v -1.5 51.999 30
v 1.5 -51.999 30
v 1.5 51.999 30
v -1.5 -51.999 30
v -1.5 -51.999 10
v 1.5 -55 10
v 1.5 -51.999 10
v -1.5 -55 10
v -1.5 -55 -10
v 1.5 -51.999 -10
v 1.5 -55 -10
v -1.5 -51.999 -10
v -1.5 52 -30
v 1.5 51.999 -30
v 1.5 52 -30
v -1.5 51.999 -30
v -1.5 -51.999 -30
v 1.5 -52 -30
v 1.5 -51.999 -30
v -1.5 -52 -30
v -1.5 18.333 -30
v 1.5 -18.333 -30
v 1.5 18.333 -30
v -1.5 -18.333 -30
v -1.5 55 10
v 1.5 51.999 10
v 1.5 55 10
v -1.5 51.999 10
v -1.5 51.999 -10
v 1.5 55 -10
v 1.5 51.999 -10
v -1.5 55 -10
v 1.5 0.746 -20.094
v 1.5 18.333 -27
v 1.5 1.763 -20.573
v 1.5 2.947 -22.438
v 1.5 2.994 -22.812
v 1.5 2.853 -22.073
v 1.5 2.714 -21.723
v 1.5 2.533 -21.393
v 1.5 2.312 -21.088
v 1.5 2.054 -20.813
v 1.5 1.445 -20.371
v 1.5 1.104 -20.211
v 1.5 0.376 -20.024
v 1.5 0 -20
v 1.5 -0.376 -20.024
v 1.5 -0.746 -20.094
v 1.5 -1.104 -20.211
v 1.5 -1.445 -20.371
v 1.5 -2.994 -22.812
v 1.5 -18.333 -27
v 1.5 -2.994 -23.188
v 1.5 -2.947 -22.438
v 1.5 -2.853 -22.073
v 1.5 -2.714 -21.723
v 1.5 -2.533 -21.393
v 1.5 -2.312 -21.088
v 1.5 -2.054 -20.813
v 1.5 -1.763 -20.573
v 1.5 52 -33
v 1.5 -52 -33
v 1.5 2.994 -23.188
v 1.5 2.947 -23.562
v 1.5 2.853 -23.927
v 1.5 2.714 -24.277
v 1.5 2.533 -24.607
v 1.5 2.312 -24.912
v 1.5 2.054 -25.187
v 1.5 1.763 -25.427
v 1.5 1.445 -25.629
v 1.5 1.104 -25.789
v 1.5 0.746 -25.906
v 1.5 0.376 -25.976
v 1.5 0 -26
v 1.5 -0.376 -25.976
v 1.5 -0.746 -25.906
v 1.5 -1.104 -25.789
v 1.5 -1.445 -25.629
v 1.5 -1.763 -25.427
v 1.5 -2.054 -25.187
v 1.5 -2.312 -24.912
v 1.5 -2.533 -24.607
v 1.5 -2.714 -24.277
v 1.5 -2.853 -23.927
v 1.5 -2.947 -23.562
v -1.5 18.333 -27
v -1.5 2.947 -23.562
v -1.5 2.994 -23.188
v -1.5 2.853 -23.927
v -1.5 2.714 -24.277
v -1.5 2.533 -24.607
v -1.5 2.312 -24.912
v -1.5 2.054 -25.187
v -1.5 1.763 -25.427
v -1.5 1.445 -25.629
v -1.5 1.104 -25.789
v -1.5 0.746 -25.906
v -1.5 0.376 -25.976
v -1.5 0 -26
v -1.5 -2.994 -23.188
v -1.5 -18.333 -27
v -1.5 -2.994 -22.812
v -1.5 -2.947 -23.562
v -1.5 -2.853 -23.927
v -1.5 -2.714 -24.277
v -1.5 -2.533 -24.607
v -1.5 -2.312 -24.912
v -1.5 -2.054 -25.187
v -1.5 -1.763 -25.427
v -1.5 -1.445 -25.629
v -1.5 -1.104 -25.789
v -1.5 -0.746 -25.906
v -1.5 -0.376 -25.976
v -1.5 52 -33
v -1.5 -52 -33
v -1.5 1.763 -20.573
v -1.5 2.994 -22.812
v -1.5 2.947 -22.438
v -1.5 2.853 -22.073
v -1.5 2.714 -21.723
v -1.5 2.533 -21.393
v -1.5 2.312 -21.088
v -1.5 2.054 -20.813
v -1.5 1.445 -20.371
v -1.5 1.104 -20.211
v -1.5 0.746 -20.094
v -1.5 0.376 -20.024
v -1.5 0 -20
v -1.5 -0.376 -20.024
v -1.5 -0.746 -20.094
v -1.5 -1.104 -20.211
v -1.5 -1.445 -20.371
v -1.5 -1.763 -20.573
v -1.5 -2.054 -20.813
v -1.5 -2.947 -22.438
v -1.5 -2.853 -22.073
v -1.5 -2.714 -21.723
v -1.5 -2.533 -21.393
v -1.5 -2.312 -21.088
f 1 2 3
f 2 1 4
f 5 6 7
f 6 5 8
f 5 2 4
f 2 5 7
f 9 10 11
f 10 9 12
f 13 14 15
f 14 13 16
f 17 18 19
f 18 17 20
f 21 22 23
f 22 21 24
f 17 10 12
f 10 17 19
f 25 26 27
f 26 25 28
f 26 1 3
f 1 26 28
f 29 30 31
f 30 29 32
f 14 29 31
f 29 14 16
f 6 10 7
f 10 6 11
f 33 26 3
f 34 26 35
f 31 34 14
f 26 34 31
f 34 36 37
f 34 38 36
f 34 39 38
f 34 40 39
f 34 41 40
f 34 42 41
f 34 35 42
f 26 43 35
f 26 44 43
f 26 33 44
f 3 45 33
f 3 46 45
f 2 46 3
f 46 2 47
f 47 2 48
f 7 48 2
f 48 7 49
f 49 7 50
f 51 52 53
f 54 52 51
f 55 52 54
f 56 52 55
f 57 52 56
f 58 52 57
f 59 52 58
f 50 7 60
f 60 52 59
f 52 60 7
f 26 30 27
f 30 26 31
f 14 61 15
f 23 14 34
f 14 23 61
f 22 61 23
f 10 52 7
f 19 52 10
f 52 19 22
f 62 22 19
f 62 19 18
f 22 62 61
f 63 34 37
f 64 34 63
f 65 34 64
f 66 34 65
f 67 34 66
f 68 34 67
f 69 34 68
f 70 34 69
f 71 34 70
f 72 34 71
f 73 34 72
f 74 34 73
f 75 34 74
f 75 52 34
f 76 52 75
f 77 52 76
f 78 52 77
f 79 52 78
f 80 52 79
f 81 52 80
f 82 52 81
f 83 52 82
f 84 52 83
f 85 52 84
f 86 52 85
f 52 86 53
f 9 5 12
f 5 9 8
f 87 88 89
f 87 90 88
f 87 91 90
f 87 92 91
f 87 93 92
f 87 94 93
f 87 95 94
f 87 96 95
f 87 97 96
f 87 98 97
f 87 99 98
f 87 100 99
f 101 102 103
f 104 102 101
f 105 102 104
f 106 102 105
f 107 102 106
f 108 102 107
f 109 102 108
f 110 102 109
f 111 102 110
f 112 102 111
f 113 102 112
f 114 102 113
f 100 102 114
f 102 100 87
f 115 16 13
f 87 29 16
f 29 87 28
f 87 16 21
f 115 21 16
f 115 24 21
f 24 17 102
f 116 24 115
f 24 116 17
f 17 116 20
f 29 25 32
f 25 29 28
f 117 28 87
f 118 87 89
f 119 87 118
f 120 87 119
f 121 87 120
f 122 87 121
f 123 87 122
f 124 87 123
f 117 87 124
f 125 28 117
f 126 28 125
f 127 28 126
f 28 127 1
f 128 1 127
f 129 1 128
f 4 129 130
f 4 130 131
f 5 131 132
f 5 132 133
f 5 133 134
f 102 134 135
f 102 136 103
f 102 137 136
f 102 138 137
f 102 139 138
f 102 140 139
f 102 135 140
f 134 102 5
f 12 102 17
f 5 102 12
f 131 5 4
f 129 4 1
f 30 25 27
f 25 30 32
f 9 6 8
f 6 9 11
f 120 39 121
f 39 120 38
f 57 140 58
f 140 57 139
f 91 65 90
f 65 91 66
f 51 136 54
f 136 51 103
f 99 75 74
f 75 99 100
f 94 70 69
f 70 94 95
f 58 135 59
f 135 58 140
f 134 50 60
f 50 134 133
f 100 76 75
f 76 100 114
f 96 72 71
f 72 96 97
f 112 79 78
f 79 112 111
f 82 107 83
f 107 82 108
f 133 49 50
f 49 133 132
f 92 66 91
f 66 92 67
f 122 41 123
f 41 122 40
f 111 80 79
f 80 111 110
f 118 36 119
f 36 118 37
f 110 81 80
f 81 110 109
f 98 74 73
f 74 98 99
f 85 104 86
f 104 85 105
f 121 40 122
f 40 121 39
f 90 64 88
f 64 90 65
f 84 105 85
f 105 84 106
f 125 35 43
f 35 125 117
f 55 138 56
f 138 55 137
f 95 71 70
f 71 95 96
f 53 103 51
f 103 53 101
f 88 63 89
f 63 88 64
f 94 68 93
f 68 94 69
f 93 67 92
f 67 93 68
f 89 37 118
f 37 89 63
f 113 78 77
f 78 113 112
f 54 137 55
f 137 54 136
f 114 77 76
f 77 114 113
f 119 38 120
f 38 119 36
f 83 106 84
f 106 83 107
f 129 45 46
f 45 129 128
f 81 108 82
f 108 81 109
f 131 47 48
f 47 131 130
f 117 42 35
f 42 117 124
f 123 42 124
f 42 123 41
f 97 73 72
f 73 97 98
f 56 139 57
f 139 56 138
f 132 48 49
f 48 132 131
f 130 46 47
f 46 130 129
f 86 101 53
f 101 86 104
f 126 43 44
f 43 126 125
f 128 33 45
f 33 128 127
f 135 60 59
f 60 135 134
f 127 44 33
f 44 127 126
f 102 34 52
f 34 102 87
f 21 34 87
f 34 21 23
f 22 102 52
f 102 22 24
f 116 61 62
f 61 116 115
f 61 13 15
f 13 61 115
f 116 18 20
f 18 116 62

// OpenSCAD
// file: measures.scad
/*
 * All measures of the model
 * Default units: Millimeters
 */

// rendering parameters
$fn = 50;

// material to cut from
material_x = 430;
material_y = 270;
material_z = 3;

// house cuboid
house_x = 150;
house_y = 110;
house_z = 60;

// distances from left and bottom house edges
door_x = 35;
door_z = 35;
door_radius = 35/2;

window_z = 12;

// how many holes per edge
strap_hole_count = 1;
strap_hole_radius = 3;
strap_hole_spacing = house_y/(strap_hole_count+1);
strap_hole_to_edge = 7;

// angle between upper house cuboid edge and roof plane in degrees
roof_angle = 30;

// elevation inside roof corner above upper edge of house cuboid
roof_elevation = tan(roof_angle) * house_x/2;

// length of a roof plane from top corner to house cuboid corner
roof_hypothenuse = 1/cos(roof_angle) * house_x/2;

// make roof a little longer than required
roof_plane_x = roof_hypothenuse * 1.2;
roof_plane_y = house_y * 1.2;

screw_radius = 4;
screw_length = 20;
washer_radius = 9;
nut_height = 3.2;
nut_wrench_size = 7;
// length between screw head and upper edge of nut
nut_position = 7;
// main file
include <measures.scad>;

module face_side()
{
    difference()
    {
        cube([
            material_z,
            house_y,
            house_z
            ], center=true);

        // hole
        for (i=[1:strap_hole_count])
        {
            translate([
                0,
                -house_y/2 + i*strap_hole_spacing,
                -house_z/2 + strap_hole_to_edge
                ])
            // rotate cylinder into yz-plane
            rotate([
                0,
                90,
                0
                ])
            cylinder(
                r=strap_hole_radius,
                h=material_z*1.2,
                center=true
                );
        }

        // nose cutaways on the side
        for (y=[-house_y/2+material_z/2, +house_y/2-material_z/2])
        {
            for (z=[+house_z/3, -house_z/3])
            {
                translate([
                    0,
                    y,
                    z
                    ])
                cube([
                    material_z*1.2,
                    material_z*1.001,
                    house_z/3
                    ], center=true);
            }
        }

        // nose cutaways on the bottom
        translate([
            0,
            0,
            -house_z/2+material_z/2
            ])
        cube([
            material_z*1.2,
            house_y/3,
            material_z
            ], center=true);
    }


    // nose support structure
    translate([
        0,
        0,
        -house_z/2 - material_z/2
        ])
    cube([
        material_z,
        house_y - 2*material_z,
        material_z
        ], center=true);
}

face_side();
